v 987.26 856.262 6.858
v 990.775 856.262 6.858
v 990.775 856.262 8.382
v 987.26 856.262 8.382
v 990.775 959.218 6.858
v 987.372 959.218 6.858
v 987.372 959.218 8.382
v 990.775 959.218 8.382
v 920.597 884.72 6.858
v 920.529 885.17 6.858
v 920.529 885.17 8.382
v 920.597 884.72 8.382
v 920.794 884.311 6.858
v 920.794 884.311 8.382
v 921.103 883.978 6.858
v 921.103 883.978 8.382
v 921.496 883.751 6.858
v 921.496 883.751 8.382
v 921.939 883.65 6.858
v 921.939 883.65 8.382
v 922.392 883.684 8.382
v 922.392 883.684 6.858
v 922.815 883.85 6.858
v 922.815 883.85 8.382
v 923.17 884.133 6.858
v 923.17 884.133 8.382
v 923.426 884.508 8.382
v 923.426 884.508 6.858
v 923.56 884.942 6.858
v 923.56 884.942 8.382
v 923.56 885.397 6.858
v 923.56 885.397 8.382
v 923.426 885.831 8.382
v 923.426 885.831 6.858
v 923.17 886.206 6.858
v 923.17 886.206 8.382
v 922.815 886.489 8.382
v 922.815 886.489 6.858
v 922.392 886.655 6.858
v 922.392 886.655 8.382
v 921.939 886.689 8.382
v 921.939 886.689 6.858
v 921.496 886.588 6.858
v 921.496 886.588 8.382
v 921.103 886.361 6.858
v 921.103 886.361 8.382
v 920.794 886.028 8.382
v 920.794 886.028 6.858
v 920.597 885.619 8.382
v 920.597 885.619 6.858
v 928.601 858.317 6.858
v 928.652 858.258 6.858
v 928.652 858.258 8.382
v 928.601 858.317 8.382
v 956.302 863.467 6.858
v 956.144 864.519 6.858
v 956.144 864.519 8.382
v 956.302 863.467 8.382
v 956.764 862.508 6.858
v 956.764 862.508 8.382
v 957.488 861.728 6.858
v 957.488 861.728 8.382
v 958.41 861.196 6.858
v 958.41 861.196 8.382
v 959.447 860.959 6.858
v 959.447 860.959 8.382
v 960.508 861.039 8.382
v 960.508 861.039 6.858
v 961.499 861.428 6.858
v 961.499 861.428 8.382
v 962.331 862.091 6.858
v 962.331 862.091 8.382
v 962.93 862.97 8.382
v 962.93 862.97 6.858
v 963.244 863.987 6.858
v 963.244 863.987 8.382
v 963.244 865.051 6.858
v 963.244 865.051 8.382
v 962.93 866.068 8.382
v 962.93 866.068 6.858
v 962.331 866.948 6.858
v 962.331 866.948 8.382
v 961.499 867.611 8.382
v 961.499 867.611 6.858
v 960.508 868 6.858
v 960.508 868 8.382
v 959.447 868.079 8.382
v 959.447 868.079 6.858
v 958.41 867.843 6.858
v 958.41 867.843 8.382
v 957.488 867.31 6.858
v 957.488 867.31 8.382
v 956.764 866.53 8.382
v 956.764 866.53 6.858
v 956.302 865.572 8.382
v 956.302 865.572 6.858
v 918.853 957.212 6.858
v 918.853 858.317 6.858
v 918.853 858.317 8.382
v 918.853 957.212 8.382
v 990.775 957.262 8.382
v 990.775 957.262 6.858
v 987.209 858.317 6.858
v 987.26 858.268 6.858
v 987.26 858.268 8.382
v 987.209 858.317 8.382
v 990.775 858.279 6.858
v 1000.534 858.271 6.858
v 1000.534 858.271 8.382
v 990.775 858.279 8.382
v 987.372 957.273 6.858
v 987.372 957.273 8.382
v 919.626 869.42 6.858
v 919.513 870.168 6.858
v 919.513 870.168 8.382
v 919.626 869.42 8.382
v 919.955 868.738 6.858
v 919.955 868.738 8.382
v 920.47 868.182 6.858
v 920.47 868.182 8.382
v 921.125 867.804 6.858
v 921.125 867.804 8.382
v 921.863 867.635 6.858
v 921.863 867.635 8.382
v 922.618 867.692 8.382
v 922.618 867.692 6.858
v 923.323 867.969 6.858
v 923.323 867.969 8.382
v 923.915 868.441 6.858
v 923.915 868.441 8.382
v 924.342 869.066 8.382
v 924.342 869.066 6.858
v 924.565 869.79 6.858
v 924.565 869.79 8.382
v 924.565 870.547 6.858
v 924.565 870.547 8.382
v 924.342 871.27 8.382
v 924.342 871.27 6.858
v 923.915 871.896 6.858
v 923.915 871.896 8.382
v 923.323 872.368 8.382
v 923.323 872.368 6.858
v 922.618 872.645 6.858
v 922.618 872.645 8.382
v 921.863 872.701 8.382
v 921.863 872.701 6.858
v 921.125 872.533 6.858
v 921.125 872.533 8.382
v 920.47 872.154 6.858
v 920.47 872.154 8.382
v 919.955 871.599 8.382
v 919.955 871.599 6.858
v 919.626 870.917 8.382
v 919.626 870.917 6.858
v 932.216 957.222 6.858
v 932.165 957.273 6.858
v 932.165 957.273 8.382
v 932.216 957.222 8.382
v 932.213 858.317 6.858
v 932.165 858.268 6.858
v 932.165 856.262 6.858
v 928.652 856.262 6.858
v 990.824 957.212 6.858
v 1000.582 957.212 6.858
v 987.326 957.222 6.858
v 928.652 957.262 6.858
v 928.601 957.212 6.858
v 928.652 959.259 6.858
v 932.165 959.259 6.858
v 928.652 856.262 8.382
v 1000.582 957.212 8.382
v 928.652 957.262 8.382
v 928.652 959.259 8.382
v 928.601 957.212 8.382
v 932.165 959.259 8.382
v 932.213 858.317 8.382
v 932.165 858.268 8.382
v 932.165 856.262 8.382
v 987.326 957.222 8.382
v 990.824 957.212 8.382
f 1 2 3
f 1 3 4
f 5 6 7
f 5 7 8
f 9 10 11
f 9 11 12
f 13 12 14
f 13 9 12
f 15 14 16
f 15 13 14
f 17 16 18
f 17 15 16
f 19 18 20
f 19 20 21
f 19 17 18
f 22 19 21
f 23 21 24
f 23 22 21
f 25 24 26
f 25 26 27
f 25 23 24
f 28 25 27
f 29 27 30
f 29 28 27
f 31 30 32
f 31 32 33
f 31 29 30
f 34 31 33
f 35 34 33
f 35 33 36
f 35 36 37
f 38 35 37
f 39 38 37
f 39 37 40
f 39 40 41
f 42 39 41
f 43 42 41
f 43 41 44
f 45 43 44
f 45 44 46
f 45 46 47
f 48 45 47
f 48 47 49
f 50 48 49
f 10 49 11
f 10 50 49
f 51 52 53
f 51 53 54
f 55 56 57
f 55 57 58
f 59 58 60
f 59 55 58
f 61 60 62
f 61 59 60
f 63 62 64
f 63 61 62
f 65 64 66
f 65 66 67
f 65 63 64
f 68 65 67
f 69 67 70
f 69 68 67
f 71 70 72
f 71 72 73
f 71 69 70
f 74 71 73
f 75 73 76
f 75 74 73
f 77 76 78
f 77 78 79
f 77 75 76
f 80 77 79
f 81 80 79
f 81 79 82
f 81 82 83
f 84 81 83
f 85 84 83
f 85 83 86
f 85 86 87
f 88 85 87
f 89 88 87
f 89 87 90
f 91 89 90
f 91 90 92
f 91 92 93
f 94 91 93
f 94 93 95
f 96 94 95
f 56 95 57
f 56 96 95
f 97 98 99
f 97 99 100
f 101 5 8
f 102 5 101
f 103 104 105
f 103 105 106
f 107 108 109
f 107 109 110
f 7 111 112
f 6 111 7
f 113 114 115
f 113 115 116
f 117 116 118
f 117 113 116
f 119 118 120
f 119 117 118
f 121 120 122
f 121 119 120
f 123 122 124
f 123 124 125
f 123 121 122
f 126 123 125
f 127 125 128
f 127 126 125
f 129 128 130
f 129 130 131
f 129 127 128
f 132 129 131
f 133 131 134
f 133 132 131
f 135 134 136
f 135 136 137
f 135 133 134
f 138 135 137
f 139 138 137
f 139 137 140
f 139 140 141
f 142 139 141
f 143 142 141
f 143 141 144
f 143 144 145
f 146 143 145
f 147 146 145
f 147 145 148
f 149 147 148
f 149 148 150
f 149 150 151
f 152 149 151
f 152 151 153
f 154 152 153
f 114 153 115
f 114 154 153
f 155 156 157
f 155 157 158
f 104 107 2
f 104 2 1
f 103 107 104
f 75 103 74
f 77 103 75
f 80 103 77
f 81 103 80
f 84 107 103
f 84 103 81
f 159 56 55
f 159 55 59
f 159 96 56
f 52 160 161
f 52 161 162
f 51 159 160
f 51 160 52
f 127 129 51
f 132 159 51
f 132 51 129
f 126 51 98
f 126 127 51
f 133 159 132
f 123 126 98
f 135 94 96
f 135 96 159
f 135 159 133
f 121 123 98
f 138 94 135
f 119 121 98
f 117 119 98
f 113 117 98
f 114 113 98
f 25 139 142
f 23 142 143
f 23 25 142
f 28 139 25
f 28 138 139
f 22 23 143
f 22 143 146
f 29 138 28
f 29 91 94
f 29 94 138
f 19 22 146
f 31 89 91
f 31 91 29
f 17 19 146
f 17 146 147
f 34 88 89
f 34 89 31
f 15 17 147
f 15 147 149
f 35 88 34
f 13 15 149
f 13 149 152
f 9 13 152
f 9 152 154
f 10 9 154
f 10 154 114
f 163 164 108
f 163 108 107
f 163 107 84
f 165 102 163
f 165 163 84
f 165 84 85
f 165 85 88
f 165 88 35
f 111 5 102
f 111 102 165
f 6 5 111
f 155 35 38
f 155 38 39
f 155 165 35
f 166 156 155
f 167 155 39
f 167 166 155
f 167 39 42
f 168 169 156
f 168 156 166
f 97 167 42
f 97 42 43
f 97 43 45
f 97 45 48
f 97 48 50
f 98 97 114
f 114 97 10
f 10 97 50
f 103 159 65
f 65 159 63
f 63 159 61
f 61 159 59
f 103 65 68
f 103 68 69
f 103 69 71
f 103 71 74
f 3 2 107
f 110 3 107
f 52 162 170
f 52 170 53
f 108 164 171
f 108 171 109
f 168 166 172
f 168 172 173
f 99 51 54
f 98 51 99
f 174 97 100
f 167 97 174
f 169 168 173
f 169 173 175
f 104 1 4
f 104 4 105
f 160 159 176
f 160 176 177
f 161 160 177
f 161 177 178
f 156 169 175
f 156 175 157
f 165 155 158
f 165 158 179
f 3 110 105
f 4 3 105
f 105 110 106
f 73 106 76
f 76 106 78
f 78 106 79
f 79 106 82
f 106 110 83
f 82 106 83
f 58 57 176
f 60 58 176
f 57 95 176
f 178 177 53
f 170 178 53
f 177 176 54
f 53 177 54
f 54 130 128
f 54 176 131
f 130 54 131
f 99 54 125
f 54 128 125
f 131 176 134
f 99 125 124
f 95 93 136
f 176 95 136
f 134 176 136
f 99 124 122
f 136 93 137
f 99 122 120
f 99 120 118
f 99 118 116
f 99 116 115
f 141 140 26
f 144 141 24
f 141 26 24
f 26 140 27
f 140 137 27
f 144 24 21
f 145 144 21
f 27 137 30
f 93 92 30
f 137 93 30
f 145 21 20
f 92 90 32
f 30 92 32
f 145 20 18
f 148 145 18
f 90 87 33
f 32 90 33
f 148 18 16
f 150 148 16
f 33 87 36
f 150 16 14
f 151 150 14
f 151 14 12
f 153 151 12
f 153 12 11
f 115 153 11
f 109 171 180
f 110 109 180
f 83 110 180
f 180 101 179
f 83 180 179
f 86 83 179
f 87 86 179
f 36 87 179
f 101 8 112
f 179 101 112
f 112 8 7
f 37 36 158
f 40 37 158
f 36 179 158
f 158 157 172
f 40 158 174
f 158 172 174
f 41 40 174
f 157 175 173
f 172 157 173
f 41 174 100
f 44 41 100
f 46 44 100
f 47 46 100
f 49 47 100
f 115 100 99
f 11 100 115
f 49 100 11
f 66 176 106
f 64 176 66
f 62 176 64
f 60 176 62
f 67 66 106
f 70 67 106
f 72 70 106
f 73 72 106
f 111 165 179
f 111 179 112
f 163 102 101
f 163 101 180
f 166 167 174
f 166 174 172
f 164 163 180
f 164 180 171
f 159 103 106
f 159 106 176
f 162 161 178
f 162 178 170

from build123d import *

# Parameters (mm, degrees)
MODEL_R             = 35.6997
MODEL_R_2           = 25.4
MODEL_R_3           = 15.24
BOSS_EXTRUDE2_DEPTH = 15.24
SCALE1_SCALE        = 0.1


with BuildPart() as part:
    # Model → Boss-Extrude2 (new body)
    with BuildSketch(Plane.XY):
        Polygon((683.6156, 410.2862), (683.133, 409.8036), (683.133, 389.7376), (648.0048, 389.7376), (648.0048, 409.702), (647.4968, 410.2862), (550.0116, 410.2862), (550.0116, 1399.2352), (647.4968, 1399.2352), (648.0048, 1399.7432), (648.0048, 1419.7076), (683.133, 1419.7076), (683.133, 1399.8448), (683.641, 1399.3368), (1234.7448, 1399.3368), (1235.202, 1399.8448), (1235.202, 1419.3012), (1269.238, 1419.3012), (1269.238, 1399.7432), (1269.7206, 1399.2352), (1367.3074, 1399.2352), (1366.8248, 409.829), (1269.238, 409.9052), (1269.238, 409.8036), (1269.238, 389.7376), (1234.0844, 389.7376), (1234.0844, 409.8036), (1233.5764, 410.2862), align=None)
        with Locations(Location((958.6214, 472.313, 0), (0, 0, 180))):
            Circle(MODEL_R, mode=Mode.SUBTRACT)
        with Locations(Location((582.0156, 528.8026, 0), (0, 0, 180))):
            Circle(MODEL_R_2, mode=Mode.SUBTRACT)
        with Locations(Location((582.0156, 678.815, 0), (0, 0, 180))):
            Circle(MODEL_R_3, mode=Mode.SUBTRACT)
    extrude(amount=BOSS_EXTRUDE2_DEPTH)


with BuildPart() as part_1:
    # Scale1: scaled about (959.835155039, 908.097861416, 7.62)
    add(part.part.scale(SCALE1_SCALE).moved(Location((863.851639535, 817.288075274, 6.858))))


solid = part_1.part
